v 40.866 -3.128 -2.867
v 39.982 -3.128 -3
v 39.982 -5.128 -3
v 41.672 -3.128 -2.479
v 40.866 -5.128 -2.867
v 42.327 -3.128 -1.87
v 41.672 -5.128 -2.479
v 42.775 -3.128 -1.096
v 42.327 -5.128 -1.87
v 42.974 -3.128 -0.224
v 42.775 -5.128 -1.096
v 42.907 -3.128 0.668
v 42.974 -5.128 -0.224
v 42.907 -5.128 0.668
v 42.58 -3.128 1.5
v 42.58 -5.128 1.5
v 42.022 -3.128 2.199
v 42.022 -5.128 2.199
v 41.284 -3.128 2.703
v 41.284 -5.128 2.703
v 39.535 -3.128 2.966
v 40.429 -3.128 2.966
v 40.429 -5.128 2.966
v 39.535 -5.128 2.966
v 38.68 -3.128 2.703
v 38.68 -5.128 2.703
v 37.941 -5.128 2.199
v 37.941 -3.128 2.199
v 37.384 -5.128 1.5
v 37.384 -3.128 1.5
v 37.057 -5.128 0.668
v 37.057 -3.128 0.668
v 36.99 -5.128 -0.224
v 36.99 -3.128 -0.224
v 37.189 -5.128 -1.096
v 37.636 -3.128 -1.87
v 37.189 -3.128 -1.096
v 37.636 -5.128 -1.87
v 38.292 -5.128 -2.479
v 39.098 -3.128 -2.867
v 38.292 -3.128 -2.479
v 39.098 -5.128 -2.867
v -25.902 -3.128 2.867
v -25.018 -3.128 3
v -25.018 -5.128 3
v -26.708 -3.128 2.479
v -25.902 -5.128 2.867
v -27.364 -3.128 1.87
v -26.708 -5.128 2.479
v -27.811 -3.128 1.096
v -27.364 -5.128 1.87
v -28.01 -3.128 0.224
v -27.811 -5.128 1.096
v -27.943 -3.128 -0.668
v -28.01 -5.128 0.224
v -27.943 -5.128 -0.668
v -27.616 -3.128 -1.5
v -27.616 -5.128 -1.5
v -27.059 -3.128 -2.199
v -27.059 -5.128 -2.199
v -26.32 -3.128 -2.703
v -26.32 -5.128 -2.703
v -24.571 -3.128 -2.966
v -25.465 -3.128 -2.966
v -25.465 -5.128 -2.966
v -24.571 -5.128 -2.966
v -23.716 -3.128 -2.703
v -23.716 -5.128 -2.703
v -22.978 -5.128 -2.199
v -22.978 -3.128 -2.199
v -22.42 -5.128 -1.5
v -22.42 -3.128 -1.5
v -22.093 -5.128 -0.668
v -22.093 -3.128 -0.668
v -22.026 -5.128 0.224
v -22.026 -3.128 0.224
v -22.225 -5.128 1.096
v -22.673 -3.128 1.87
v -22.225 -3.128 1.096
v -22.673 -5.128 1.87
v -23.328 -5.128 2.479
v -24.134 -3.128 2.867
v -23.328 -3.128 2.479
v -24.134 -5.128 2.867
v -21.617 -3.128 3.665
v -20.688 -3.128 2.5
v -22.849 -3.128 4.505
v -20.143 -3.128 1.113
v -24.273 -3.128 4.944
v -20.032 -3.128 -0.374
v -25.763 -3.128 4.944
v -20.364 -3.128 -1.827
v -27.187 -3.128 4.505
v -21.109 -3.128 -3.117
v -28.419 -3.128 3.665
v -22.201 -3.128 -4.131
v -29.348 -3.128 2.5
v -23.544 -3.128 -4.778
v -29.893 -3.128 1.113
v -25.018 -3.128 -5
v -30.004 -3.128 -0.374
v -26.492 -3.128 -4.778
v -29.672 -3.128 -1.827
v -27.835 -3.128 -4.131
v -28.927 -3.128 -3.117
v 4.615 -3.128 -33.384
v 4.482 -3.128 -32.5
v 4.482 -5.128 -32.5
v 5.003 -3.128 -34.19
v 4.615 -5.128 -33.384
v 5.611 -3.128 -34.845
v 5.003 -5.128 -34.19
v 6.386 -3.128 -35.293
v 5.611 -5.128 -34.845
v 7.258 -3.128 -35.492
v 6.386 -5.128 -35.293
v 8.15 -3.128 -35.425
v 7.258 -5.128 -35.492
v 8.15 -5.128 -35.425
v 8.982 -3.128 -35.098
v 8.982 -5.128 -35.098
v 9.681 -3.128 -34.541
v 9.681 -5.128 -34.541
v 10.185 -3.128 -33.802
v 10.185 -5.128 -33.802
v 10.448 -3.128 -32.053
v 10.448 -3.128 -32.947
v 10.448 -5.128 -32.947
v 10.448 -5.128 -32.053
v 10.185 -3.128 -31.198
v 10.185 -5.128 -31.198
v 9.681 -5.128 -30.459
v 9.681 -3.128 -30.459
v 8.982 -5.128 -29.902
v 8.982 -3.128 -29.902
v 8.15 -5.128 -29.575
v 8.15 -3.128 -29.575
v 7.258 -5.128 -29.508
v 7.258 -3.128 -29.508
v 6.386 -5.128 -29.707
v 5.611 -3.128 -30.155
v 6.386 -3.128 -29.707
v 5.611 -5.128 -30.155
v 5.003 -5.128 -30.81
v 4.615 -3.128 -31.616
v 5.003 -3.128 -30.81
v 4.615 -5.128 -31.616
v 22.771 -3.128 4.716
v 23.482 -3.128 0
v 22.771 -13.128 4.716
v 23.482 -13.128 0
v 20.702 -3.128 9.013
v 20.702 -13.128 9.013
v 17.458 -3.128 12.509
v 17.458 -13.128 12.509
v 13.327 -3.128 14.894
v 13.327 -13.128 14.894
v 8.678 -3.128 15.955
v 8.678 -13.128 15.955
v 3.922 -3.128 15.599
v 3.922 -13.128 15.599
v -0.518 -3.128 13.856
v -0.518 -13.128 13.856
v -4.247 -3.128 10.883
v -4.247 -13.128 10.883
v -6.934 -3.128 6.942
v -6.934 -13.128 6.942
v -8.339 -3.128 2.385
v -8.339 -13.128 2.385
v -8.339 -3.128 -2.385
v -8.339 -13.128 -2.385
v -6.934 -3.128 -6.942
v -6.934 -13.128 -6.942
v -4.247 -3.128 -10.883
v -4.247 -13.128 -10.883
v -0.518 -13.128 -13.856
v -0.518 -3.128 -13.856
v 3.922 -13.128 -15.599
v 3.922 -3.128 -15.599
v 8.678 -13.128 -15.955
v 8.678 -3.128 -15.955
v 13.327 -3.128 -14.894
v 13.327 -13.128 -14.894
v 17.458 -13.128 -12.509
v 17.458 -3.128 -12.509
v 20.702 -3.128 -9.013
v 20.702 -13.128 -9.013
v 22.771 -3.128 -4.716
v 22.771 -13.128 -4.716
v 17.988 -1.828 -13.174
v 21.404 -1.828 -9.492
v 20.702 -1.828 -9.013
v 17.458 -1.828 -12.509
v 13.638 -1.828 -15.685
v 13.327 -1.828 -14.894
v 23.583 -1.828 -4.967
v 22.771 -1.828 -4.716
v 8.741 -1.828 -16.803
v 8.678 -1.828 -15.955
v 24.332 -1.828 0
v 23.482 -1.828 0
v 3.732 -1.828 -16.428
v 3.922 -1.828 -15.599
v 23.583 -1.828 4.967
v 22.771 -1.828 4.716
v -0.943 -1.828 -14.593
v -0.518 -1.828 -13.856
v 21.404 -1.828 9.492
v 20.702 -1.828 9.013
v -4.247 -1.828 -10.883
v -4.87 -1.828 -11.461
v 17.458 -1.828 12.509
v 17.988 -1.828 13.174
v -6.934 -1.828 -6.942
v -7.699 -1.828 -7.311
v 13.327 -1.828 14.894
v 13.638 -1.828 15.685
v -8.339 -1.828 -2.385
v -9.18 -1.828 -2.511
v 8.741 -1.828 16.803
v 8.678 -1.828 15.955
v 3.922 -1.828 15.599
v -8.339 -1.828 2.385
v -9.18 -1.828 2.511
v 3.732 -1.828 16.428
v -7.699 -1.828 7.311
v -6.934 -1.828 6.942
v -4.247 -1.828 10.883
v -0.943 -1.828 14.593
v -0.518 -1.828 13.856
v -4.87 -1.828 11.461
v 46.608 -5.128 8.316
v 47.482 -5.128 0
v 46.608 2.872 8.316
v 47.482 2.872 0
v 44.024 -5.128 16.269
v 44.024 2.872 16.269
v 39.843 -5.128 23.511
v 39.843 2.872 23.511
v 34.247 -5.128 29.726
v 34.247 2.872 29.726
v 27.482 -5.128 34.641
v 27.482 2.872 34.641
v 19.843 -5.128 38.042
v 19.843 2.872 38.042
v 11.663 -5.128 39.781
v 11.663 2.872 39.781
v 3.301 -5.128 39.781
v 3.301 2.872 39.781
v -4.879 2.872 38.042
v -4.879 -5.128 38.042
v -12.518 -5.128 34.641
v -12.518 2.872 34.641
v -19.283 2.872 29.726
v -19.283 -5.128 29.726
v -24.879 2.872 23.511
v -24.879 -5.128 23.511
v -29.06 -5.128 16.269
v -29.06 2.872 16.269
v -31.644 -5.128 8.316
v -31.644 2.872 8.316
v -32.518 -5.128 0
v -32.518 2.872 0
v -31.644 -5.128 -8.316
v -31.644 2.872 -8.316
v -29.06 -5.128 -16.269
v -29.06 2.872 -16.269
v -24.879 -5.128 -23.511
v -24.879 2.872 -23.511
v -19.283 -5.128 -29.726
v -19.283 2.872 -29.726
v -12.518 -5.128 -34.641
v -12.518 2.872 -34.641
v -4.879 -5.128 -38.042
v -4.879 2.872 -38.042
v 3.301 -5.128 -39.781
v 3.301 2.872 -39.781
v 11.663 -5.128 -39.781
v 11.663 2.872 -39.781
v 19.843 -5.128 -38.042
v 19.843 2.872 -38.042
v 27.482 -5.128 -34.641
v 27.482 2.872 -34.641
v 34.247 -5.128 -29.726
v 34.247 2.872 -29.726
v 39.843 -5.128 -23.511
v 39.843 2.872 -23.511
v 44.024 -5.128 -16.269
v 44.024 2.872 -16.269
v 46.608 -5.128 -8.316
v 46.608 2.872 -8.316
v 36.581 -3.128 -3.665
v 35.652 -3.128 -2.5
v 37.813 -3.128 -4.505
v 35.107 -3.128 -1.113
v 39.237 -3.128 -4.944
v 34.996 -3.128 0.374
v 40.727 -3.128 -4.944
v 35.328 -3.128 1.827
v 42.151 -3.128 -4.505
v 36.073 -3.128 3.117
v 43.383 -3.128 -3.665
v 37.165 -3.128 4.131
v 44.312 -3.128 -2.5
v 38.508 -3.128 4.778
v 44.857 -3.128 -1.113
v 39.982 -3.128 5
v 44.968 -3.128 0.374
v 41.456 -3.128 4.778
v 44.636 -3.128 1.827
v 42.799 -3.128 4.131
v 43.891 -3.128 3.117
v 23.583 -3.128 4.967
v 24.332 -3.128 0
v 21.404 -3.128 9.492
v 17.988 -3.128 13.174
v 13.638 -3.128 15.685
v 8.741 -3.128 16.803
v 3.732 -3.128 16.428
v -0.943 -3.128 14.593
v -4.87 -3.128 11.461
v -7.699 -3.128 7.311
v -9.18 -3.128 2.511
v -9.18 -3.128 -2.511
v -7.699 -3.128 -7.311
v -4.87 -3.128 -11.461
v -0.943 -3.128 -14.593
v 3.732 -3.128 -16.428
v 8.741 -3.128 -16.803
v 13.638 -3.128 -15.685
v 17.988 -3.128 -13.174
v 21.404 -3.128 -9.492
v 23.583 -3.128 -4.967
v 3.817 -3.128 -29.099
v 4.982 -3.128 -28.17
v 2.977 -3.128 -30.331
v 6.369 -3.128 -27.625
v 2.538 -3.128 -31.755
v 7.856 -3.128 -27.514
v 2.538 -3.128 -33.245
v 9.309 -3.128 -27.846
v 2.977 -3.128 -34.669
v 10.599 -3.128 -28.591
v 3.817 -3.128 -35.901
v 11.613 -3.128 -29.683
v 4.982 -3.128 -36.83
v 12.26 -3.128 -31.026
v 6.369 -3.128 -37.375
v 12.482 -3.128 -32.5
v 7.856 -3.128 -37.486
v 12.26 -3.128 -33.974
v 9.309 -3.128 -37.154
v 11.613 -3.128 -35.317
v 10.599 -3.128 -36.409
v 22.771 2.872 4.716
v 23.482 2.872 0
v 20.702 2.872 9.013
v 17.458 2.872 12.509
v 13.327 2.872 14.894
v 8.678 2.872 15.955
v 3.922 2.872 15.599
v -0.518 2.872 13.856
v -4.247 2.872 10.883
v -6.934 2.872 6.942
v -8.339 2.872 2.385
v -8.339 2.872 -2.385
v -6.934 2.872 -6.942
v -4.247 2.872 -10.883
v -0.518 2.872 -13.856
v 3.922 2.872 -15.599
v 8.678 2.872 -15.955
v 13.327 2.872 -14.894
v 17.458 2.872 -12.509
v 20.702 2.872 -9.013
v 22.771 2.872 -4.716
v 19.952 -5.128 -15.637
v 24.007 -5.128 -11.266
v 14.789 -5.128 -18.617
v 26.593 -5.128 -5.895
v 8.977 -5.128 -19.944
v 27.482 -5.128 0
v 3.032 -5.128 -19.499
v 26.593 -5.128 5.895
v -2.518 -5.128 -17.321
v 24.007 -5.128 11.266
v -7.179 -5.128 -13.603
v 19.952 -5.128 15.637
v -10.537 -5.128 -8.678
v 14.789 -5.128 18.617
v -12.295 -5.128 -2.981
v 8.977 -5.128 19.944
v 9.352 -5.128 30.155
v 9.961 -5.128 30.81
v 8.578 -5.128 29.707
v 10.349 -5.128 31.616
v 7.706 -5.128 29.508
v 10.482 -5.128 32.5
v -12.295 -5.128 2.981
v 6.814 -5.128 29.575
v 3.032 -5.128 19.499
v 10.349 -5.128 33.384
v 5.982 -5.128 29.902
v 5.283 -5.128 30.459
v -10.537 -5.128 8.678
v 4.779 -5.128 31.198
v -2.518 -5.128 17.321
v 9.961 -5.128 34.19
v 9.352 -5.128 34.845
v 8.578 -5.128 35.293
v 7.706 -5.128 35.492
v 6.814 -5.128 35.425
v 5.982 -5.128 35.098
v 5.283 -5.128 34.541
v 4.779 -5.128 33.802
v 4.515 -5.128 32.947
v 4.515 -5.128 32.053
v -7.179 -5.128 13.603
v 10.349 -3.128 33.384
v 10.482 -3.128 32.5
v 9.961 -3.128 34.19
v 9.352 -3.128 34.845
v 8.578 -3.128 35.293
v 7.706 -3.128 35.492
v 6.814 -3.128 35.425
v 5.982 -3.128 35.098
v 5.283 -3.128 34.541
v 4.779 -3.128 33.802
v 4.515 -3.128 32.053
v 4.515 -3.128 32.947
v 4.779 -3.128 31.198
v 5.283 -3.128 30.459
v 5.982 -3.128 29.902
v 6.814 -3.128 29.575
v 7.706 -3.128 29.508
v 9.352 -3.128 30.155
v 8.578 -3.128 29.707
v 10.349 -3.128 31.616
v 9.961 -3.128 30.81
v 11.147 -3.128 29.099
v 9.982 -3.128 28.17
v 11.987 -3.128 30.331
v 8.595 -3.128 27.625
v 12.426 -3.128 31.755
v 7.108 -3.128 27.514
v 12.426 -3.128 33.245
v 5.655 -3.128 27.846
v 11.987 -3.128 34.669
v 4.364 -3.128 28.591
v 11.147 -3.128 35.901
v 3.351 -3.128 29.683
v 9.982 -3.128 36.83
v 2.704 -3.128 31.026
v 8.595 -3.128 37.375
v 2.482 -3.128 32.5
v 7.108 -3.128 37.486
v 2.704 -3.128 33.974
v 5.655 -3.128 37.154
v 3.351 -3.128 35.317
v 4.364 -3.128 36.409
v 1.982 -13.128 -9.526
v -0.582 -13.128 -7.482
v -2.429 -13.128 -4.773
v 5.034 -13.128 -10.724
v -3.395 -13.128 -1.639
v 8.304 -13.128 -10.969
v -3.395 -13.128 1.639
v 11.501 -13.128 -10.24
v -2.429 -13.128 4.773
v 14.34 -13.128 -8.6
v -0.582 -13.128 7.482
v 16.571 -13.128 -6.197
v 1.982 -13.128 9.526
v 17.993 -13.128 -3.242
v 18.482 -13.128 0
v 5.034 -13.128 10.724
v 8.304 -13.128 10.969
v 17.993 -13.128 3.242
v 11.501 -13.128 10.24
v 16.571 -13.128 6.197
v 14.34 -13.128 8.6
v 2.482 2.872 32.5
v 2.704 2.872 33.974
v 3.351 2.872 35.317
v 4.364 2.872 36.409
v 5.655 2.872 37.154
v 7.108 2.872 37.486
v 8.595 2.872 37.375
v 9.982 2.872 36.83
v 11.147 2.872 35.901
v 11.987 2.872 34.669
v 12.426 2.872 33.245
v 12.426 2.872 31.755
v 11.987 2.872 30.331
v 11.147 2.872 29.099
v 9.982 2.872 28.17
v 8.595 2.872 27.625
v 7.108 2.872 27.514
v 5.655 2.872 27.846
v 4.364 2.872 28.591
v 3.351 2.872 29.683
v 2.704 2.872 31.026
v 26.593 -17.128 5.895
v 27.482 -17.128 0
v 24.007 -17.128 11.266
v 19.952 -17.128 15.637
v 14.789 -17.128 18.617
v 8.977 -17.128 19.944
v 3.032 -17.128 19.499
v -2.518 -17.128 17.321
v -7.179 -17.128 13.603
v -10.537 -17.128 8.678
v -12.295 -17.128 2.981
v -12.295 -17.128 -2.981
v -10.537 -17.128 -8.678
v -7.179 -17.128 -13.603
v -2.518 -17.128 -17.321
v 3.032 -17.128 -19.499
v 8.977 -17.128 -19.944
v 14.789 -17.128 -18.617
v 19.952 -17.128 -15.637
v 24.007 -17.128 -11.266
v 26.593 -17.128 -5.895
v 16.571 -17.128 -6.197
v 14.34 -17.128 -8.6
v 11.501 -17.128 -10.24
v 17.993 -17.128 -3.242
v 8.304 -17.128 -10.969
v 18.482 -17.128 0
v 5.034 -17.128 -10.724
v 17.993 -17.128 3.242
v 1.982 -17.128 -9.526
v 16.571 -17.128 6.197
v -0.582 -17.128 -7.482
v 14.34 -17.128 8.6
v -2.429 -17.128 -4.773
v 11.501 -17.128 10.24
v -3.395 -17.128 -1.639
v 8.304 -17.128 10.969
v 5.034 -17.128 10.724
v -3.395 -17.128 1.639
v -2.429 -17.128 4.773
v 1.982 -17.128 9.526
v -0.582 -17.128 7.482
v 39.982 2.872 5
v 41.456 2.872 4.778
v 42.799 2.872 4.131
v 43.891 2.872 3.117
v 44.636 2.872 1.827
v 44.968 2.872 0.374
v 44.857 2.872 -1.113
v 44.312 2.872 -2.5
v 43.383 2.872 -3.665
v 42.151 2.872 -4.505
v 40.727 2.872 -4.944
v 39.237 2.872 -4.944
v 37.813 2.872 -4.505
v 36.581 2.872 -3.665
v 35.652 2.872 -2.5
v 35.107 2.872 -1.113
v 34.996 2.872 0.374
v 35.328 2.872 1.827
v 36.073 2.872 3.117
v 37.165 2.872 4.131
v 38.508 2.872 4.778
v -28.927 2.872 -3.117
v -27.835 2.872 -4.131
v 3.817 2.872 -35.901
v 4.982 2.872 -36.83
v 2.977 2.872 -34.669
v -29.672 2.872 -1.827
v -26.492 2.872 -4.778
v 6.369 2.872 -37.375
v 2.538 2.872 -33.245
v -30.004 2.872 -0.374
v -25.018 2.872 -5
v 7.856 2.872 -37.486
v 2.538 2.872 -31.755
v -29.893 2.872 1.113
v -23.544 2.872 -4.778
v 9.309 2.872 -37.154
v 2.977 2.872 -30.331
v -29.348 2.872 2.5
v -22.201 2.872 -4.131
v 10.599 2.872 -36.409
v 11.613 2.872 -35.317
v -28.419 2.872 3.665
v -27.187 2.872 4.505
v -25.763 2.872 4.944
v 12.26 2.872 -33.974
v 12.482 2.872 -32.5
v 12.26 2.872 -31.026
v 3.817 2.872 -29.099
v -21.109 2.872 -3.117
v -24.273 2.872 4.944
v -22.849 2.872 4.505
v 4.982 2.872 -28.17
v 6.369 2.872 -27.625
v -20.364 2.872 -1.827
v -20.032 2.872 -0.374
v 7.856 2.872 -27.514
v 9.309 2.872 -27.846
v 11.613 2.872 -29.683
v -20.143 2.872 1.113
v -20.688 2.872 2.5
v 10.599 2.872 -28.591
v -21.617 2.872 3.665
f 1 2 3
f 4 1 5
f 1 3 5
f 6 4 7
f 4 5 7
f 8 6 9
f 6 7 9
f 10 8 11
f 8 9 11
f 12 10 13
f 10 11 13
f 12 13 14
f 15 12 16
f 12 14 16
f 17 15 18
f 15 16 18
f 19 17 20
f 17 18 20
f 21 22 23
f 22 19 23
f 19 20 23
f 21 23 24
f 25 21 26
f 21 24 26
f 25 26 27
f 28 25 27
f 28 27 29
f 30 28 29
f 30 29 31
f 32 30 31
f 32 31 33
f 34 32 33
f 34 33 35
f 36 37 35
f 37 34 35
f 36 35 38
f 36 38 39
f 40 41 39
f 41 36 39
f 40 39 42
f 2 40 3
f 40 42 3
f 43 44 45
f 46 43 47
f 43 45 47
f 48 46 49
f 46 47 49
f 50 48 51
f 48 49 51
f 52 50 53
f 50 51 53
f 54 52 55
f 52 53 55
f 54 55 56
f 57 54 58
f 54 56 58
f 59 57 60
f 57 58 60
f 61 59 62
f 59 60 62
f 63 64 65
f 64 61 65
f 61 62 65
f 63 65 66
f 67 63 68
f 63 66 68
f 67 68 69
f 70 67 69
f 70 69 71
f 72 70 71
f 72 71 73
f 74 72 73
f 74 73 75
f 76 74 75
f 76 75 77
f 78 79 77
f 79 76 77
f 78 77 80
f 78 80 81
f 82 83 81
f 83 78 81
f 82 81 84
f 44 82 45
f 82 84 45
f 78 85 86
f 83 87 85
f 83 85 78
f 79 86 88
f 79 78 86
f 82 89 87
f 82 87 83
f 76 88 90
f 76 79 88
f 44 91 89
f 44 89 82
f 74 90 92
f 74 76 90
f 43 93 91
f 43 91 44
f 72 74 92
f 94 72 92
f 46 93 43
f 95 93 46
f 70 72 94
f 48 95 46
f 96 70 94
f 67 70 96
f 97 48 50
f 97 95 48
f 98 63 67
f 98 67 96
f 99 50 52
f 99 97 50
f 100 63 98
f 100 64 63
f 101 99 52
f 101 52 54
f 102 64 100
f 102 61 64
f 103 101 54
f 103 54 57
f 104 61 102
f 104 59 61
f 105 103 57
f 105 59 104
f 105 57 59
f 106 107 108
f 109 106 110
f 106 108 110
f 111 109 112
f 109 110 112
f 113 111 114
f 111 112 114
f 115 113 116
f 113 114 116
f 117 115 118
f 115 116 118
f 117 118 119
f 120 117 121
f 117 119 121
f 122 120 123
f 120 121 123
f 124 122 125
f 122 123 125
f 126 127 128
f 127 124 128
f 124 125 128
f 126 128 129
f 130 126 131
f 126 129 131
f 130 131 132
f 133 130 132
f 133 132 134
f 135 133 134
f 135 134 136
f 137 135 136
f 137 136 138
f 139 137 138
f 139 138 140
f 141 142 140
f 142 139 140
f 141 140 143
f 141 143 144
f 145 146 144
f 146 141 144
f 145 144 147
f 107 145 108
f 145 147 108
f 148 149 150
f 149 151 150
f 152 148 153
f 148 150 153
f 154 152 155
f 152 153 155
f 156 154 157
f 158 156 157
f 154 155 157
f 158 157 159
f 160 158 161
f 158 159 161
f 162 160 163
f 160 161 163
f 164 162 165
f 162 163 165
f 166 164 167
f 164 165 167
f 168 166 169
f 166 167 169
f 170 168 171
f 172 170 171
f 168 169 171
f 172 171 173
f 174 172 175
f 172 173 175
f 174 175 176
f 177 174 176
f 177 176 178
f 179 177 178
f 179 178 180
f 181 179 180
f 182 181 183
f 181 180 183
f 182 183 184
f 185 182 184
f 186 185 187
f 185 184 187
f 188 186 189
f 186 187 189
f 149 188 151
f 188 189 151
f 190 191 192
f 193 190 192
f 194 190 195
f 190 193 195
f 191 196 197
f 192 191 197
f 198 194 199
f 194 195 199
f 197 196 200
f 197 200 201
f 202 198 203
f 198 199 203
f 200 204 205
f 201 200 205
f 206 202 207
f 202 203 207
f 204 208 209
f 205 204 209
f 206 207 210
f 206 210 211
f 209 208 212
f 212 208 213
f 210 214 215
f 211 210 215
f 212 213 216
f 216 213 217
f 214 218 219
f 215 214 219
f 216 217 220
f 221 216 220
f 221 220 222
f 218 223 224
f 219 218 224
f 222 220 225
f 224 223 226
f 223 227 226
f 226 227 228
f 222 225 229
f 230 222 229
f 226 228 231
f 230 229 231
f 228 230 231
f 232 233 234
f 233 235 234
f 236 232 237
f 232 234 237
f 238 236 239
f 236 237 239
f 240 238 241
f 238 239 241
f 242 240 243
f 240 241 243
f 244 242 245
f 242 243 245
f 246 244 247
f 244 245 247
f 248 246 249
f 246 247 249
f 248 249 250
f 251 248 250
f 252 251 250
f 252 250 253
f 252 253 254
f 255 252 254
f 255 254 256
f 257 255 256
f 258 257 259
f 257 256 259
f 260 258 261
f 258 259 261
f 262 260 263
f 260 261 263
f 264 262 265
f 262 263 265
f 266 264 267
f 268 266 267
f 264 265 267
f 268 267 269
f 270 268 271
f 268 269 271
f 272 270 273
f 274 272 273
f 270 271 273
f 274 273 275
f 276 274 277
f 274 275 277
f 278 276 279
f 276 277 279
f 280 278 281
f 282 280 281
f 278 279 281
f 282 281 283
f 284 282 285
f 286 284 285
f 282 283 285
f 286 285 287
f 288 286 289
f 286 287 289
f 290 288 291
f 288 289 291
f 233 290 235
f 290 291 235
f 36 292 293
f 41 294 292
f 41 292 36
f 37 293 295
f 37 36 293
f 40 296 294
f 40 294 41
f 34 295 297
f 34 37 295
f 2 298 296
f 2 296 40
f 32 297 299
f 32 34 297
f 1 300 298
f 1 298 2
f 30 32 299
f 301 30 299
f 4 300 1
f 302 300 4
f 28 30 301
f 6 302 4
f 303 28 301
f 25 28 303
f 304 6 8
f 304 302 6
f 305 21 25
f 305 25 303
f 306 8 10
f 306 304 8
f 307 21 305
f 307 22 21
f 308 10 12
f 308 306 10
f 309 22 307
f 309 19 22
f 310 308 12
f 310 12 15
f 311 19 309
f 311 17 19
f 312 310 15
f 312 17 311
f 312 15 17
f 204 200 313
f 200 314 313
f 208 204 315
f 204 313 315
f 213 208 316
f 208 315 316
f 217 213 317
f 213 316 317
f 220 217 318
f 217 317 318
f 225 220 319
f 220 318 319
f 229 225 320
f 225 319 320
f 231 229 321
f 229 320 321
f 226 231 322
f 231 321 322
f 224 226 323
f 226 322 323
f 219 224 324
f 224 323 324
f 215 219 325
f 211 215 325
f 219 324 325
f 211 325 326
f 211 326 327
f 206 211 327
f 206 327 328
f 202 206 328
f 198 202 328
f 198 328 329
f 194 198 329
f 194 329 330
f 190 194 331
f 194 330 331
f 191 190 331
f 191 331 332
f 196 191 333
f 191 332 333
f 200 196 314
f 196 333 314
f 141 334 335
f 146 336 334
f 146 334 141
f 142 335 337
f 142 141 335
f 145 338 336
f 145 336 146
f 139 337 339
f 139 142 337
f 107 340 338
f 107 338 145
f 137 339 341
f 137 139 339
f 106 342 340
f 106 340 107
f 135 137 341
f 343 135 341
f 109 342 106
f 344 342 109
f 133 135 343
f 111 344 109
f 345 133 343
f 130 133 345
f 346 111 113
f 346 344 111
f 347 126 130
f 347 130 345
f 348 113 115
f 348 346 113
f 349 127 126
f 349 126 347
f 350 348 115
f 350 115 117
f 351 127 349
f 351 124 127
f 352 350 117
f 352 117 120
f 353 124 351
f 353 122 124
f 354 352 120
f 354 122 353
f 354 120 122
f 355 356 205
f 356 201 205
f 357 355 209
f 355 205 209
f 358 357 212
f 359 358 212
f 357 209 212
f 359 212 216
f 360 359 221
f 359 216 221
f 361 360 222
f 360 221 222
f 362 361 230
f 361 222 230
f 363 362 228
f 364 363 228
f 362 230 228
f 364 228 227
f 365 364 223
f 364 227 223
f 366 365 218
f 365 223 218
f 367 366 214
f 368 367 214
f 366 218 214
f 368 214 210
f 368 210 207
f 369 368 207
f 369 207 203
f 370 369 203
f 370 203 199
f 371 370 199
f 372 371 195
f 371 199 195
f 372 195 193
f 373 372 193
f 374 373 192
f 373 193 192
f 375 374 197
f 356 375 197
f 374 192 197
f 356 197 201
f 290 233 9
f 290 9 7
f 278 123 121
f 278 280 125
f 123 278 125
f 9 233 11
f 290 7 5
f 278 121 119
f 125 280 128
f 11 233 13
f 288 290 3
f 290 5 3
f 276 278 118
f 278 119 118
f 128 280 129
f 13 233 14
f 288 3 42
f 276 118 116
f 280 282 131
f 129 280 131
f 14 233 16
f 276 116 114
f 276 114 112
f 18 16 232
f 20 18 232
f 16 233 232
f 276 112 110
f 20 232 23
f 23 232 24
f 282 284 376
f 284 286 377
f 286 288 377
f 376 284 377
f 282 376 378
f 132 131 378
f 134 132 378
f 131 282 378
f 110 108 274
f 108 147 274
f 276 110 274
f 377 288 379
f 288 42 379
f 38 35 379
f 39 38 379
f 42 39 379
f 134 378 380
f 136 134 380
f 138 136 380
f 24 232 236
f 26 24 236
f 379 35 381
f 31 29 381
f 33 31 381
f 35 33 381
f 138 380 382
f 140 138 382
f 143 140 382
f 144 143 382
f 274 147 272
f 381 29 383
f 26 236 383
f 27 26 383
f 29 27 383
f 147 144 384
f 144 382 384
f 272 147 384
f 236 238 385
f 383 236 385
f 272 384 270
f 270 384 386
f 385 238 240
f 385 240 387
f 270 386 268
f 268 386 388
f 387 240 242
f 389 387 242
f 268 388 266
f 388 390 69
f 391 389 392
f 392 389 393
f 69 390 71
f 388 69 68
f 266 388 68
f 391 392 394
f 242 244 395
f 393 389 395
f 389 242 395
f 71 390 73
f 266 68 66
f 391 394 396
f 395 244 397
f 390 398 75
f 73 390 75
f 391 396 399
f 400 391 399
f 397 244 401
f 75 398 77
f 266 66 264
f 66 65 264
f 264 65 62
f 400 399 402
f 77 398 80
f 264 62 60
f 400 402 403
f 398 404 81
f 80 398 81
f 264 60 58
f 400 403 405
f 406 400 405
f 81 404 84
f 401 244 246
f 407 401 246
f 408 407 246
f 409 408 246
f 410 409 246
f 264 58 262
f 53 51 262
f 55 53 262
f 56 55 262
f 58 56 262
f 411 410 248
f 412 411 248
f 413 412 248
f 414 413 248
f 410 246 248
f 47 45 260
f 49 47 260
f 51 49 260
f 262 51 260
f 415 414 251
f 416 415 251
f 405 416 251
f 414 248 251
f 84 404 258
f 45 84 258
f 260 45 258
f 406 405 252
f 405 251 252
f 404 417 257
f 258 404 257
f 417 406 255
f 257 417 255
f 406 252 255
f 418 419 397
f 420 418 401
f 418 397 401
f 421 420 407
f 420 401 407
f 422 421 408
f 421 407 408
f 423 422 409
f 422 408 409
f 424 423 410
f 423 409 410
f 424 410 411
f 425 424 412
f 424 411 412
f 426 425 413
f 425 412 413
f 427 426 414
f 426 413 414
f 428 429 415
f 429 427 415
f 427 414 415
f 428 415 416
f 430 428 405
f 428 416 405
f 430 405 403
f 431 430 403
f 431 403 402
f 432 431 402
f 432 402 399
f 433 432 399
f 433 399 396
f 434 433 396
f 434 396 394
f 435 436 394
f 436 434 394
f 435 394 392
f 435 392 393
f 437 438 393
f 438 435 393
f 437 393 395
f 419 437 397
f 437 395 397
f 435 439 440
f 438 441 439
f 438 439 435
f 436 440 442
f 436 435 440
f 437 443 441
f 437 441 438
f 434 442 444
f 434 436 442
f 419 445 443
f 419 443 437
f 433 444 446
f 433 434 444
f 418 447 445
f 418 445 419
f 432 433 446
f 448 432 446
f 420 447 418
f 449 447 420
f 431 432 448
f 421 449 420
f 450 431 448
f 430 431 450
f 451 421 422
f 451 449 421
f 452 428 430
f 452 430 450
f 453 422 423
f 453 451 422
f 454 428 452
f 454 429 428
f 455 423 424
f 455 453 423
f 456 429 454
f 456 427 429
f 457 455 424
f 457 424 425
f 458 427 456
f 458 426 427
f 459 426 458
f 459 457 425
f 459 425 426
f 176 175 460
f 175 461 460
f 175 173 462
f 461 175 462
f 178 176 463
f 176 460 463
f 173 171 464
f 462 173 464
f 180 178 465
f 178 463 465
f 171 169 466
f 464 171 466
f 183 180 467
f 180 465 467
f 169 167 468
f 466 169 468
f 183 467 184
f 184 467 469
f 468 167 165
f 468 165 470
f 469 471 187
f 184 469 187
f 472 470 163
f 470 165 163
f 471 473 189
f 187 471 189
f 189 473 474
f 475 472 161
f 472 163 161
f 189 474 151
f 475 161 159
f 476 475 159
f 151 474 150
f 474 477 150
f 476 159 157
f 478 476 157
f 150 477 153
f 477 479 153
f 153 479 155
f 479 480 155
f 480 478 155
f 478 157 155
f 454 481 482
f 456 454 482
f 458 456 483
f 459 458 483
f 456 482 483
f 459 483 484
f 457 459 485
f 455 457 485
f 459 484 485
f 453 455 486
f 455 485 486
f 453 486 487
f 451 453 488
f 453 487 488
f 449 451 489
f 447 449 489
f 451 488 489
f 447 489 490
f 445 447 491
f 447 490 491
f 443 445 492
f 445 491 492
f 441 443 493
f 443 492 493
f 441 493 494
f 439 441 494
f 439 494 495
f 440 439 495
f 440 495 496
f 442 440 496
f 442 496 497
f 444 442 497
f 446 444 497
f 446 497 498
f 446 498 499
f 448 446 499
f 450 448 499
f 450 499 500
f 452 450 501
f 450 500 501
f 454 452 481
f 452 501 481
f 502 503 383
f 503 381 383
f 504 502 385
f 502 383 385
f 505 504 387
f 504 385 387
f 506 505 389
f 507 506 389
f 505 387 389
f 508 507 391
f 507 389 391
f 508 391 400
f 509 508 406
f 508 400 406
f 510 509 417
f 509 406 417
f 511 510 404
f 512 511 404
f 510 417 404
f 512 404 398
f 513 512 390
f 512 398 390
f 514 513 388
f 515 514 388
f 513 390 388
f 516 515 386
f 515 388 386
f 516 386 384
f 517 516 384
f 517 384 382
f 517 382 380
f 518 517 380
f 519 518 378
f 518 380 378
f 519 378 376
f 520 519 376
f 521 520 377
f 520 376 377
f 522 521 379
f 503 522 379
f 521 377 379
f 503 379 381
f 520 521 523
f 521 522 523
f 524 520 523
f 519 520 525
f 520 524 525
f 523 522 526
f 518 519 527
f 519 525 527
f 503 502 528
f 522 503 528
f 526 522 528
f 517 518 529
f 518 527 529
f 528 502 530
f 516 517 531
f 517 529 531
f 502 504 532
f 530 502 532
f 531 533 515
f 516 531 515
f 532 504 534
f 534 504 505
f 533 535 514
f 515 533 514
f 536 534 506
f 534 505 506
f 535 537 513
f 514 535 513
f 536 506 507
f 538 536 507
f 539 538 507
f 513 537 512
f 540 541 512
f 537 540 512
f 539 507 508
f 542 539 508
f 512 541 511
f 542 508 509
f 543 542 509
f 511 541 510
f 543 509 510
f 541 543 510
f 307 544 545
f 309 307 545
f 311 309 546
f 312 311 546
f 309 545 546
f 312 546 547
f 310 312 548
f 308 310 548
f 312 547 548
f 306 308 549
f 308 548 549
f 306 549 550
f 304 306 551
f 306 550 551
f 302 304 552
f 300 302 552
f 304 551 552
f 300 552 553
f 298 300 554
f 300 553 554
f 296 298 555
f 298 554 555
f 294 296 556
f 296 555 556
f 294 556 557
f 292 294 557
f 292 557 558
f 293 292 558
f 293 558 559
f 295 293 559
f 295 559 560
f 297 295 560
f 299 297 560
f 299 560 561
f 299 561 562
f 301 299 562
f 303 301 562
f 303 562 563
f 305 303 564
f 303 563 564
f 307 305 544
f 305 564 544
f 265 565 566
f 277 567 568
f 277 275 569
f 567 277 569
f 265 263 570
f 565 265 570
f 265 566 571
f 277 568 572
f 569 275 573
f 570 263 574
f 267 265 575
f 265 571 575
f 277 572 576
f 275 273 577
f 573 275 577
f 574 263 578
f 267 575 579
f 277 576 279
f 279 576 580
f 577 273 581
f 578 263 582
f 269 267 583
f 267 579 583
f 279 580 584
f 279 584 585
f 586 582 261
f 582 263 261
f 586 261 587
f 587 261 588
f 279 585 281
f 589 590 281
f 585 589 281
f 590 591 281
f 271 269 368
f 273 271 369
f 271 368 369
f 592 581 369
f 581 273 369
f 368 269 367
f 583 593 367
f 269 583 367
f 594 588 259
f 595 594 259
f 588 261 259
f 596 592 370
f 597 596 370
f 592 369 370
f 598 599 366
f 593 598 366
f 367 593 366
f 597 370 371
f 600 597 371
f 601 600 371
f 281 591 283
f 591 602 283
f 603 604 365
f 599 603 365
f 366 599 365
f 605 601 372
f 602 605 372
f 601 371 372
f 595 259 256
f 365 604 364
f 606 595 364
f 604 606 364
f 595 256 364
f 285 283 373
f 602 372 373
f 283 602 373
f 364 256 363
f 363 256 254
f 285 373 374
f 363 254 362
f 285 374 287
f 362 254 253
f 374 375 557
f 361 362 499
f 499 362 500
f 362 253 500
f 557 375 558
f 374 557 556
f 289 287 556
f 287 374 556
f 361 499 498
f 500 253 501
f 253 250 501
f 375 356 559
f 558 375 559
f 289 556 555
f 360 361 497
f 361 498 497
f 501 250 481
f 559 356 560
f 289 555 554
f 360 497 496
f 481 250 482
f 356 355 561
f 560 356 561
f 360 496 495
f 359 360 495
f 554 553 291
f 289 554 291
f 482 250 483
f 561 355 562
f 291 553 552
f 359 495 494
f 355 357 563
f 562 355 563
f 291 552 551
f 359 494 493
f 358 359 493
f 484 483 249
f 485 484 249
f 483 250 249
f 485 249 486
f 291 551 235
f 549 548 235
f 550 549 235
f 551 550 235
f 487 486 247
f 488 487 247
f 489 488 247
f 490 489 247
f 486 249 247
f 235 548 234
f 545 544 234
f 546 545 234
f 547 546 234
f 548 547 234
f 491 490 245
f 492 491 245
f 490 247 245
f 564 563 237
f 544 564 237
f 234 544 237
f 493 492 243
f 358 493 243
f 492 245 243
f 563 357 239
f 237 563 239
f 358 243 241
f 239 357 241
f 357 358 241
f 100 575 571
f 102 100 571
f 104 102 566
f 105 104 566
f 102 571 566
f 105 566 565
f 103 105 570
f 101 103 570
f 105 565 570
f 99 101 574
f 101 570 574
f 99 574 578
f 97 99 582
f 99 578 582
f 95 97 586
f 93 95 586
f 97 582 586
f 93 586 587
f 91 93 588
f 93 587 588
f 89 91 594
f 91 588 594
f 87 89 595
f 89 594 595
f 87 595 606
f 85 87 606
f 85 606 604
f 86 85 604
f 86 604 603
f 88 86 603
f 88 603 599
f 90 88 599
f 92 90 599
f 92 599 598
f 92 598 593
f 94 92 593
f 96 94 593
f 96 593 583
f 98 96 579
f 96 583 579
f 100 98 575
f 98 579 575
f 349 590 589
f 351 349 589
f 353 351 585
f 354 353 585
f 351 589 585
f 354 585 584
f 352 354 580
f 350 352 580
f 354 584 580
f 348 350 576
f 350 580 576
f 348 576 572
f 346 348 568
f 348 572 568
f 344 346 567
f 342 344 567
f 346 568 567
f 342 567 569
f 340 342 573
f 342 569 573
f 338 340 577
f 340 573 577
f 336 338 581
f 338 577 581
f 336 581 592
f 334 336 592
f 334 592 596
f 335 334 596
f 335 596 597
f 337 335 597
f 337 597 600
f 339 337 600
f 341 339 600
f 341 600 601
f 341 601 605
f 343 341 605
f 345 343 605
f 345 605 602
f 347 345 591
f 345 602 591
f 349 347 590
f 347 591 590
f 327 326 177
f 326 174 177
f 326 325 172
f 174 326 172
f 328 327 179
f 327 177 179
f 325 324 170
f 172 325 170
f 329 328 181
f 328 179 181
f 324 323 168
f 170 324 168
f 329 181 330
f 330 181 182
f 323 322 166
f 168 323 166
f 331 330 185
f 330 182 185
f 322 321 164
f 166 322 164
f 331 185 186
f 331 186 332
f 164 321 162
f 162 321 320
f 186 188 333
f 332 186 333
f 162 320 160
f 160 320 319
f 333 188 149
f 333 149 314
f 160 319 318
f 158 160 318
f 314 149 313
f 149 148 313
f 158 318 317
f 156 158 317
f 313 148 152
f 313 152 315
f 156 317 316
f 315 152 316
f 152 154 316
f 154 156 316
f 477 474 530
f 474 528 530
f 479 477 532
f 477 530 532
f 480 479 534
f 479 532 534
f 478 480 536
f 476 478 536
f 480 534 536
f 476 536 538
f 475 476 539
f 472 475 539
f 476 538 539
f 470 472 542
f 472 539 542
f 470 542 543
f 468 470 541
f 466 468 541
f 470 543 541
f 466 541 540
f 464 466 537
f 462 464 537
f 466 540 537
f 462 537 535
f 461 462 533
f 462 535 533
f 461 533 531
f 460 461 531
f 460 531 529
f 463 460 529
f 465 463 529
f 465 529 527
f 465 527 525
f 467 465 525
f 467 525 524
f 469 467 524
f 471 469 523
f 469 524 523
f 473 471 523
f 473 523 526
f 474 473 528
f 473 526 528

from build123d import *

# Parameters (mm, degrees)
F3_D            = 6
F3_COPIES_COUNT = 4
F4_R            = 5
F4_R_2          = 3
F5_DEPTH        = 6
F5_COPIES_COUNT = 4


# Not quite as in the source:
# - a pattern or mirror of a feature is missing from the dataset's text; its kind, count and spacing are read off the source's solid


with BuildPart() as f1:
    # F0 (on Top) → F1 (revolve)
    with BuildSketch(Plane.XY):
        Polygon((47.481939, -5.127659), (47.481939, 2.872341), (23.481939, 2.872341), (23.481939, -1.827659), (24.331939, -1.827659), (24.331939, -3.127659), (23.481939, -3.127659), (23.481939, -13.127659), (18.481939, -13.127659), (18.481939, -17.127659), (27.481939, -17.127659), (27.481939, -5.127659), align=None)
    revolve(axis=Axis((7.481939, -6.8666535, 0), (0, -1, 0)))

    # F3 (through all)
    with Locations(Plane(origin=(0, 2.872341, 0), x_dir=(-1, 0, 0), z_dir=(0, 1, 0))):
        with Locations((-7.481939, 32.5)):
            f3 = Hole(F3_D / 2)

    # F3_copies: F3 ×4 about axis
    f3_copies_axis = Axis((7.481939, 0, 0), (0, 1, 0))
    for i in range(1, F3_COPIES_COUNT):
        add(f3.rotate(f3_copies_axis, i * 360 / F3_COPIES_COUNT), mode=Mode.SUBTRACT)

    # F4 (on face) → F5 (cut)
    with BuildSketch(Plane(origin=(0, 2.872341, 0), x_dir=(-1, 0, 0), z_dir=(0, 1, 0))):
        with Locations((-7.481939, 32.5)):
            Circle(F4_R)
        with Locations((-7.481939, 32.5)):
            Circle(F4_R_2, mode=Mode.SUBTRACT)
    f5 = extrude(amount=-F5_DEPTH, mode=Mode.SUBTRACT)

    # F5_copies: F5 ×4 about axis
    f5_copies_axis = Axis((7.481939, 0, 0), (0, 1, 0))
    for i in range(1, F5_COPIES_COUNT):
        add(f5.rotate(f5_copies_axis, i * 360 / F5_COPIES_COUNT), mode=Mode.SUBTRACT)


solid = f1.part
